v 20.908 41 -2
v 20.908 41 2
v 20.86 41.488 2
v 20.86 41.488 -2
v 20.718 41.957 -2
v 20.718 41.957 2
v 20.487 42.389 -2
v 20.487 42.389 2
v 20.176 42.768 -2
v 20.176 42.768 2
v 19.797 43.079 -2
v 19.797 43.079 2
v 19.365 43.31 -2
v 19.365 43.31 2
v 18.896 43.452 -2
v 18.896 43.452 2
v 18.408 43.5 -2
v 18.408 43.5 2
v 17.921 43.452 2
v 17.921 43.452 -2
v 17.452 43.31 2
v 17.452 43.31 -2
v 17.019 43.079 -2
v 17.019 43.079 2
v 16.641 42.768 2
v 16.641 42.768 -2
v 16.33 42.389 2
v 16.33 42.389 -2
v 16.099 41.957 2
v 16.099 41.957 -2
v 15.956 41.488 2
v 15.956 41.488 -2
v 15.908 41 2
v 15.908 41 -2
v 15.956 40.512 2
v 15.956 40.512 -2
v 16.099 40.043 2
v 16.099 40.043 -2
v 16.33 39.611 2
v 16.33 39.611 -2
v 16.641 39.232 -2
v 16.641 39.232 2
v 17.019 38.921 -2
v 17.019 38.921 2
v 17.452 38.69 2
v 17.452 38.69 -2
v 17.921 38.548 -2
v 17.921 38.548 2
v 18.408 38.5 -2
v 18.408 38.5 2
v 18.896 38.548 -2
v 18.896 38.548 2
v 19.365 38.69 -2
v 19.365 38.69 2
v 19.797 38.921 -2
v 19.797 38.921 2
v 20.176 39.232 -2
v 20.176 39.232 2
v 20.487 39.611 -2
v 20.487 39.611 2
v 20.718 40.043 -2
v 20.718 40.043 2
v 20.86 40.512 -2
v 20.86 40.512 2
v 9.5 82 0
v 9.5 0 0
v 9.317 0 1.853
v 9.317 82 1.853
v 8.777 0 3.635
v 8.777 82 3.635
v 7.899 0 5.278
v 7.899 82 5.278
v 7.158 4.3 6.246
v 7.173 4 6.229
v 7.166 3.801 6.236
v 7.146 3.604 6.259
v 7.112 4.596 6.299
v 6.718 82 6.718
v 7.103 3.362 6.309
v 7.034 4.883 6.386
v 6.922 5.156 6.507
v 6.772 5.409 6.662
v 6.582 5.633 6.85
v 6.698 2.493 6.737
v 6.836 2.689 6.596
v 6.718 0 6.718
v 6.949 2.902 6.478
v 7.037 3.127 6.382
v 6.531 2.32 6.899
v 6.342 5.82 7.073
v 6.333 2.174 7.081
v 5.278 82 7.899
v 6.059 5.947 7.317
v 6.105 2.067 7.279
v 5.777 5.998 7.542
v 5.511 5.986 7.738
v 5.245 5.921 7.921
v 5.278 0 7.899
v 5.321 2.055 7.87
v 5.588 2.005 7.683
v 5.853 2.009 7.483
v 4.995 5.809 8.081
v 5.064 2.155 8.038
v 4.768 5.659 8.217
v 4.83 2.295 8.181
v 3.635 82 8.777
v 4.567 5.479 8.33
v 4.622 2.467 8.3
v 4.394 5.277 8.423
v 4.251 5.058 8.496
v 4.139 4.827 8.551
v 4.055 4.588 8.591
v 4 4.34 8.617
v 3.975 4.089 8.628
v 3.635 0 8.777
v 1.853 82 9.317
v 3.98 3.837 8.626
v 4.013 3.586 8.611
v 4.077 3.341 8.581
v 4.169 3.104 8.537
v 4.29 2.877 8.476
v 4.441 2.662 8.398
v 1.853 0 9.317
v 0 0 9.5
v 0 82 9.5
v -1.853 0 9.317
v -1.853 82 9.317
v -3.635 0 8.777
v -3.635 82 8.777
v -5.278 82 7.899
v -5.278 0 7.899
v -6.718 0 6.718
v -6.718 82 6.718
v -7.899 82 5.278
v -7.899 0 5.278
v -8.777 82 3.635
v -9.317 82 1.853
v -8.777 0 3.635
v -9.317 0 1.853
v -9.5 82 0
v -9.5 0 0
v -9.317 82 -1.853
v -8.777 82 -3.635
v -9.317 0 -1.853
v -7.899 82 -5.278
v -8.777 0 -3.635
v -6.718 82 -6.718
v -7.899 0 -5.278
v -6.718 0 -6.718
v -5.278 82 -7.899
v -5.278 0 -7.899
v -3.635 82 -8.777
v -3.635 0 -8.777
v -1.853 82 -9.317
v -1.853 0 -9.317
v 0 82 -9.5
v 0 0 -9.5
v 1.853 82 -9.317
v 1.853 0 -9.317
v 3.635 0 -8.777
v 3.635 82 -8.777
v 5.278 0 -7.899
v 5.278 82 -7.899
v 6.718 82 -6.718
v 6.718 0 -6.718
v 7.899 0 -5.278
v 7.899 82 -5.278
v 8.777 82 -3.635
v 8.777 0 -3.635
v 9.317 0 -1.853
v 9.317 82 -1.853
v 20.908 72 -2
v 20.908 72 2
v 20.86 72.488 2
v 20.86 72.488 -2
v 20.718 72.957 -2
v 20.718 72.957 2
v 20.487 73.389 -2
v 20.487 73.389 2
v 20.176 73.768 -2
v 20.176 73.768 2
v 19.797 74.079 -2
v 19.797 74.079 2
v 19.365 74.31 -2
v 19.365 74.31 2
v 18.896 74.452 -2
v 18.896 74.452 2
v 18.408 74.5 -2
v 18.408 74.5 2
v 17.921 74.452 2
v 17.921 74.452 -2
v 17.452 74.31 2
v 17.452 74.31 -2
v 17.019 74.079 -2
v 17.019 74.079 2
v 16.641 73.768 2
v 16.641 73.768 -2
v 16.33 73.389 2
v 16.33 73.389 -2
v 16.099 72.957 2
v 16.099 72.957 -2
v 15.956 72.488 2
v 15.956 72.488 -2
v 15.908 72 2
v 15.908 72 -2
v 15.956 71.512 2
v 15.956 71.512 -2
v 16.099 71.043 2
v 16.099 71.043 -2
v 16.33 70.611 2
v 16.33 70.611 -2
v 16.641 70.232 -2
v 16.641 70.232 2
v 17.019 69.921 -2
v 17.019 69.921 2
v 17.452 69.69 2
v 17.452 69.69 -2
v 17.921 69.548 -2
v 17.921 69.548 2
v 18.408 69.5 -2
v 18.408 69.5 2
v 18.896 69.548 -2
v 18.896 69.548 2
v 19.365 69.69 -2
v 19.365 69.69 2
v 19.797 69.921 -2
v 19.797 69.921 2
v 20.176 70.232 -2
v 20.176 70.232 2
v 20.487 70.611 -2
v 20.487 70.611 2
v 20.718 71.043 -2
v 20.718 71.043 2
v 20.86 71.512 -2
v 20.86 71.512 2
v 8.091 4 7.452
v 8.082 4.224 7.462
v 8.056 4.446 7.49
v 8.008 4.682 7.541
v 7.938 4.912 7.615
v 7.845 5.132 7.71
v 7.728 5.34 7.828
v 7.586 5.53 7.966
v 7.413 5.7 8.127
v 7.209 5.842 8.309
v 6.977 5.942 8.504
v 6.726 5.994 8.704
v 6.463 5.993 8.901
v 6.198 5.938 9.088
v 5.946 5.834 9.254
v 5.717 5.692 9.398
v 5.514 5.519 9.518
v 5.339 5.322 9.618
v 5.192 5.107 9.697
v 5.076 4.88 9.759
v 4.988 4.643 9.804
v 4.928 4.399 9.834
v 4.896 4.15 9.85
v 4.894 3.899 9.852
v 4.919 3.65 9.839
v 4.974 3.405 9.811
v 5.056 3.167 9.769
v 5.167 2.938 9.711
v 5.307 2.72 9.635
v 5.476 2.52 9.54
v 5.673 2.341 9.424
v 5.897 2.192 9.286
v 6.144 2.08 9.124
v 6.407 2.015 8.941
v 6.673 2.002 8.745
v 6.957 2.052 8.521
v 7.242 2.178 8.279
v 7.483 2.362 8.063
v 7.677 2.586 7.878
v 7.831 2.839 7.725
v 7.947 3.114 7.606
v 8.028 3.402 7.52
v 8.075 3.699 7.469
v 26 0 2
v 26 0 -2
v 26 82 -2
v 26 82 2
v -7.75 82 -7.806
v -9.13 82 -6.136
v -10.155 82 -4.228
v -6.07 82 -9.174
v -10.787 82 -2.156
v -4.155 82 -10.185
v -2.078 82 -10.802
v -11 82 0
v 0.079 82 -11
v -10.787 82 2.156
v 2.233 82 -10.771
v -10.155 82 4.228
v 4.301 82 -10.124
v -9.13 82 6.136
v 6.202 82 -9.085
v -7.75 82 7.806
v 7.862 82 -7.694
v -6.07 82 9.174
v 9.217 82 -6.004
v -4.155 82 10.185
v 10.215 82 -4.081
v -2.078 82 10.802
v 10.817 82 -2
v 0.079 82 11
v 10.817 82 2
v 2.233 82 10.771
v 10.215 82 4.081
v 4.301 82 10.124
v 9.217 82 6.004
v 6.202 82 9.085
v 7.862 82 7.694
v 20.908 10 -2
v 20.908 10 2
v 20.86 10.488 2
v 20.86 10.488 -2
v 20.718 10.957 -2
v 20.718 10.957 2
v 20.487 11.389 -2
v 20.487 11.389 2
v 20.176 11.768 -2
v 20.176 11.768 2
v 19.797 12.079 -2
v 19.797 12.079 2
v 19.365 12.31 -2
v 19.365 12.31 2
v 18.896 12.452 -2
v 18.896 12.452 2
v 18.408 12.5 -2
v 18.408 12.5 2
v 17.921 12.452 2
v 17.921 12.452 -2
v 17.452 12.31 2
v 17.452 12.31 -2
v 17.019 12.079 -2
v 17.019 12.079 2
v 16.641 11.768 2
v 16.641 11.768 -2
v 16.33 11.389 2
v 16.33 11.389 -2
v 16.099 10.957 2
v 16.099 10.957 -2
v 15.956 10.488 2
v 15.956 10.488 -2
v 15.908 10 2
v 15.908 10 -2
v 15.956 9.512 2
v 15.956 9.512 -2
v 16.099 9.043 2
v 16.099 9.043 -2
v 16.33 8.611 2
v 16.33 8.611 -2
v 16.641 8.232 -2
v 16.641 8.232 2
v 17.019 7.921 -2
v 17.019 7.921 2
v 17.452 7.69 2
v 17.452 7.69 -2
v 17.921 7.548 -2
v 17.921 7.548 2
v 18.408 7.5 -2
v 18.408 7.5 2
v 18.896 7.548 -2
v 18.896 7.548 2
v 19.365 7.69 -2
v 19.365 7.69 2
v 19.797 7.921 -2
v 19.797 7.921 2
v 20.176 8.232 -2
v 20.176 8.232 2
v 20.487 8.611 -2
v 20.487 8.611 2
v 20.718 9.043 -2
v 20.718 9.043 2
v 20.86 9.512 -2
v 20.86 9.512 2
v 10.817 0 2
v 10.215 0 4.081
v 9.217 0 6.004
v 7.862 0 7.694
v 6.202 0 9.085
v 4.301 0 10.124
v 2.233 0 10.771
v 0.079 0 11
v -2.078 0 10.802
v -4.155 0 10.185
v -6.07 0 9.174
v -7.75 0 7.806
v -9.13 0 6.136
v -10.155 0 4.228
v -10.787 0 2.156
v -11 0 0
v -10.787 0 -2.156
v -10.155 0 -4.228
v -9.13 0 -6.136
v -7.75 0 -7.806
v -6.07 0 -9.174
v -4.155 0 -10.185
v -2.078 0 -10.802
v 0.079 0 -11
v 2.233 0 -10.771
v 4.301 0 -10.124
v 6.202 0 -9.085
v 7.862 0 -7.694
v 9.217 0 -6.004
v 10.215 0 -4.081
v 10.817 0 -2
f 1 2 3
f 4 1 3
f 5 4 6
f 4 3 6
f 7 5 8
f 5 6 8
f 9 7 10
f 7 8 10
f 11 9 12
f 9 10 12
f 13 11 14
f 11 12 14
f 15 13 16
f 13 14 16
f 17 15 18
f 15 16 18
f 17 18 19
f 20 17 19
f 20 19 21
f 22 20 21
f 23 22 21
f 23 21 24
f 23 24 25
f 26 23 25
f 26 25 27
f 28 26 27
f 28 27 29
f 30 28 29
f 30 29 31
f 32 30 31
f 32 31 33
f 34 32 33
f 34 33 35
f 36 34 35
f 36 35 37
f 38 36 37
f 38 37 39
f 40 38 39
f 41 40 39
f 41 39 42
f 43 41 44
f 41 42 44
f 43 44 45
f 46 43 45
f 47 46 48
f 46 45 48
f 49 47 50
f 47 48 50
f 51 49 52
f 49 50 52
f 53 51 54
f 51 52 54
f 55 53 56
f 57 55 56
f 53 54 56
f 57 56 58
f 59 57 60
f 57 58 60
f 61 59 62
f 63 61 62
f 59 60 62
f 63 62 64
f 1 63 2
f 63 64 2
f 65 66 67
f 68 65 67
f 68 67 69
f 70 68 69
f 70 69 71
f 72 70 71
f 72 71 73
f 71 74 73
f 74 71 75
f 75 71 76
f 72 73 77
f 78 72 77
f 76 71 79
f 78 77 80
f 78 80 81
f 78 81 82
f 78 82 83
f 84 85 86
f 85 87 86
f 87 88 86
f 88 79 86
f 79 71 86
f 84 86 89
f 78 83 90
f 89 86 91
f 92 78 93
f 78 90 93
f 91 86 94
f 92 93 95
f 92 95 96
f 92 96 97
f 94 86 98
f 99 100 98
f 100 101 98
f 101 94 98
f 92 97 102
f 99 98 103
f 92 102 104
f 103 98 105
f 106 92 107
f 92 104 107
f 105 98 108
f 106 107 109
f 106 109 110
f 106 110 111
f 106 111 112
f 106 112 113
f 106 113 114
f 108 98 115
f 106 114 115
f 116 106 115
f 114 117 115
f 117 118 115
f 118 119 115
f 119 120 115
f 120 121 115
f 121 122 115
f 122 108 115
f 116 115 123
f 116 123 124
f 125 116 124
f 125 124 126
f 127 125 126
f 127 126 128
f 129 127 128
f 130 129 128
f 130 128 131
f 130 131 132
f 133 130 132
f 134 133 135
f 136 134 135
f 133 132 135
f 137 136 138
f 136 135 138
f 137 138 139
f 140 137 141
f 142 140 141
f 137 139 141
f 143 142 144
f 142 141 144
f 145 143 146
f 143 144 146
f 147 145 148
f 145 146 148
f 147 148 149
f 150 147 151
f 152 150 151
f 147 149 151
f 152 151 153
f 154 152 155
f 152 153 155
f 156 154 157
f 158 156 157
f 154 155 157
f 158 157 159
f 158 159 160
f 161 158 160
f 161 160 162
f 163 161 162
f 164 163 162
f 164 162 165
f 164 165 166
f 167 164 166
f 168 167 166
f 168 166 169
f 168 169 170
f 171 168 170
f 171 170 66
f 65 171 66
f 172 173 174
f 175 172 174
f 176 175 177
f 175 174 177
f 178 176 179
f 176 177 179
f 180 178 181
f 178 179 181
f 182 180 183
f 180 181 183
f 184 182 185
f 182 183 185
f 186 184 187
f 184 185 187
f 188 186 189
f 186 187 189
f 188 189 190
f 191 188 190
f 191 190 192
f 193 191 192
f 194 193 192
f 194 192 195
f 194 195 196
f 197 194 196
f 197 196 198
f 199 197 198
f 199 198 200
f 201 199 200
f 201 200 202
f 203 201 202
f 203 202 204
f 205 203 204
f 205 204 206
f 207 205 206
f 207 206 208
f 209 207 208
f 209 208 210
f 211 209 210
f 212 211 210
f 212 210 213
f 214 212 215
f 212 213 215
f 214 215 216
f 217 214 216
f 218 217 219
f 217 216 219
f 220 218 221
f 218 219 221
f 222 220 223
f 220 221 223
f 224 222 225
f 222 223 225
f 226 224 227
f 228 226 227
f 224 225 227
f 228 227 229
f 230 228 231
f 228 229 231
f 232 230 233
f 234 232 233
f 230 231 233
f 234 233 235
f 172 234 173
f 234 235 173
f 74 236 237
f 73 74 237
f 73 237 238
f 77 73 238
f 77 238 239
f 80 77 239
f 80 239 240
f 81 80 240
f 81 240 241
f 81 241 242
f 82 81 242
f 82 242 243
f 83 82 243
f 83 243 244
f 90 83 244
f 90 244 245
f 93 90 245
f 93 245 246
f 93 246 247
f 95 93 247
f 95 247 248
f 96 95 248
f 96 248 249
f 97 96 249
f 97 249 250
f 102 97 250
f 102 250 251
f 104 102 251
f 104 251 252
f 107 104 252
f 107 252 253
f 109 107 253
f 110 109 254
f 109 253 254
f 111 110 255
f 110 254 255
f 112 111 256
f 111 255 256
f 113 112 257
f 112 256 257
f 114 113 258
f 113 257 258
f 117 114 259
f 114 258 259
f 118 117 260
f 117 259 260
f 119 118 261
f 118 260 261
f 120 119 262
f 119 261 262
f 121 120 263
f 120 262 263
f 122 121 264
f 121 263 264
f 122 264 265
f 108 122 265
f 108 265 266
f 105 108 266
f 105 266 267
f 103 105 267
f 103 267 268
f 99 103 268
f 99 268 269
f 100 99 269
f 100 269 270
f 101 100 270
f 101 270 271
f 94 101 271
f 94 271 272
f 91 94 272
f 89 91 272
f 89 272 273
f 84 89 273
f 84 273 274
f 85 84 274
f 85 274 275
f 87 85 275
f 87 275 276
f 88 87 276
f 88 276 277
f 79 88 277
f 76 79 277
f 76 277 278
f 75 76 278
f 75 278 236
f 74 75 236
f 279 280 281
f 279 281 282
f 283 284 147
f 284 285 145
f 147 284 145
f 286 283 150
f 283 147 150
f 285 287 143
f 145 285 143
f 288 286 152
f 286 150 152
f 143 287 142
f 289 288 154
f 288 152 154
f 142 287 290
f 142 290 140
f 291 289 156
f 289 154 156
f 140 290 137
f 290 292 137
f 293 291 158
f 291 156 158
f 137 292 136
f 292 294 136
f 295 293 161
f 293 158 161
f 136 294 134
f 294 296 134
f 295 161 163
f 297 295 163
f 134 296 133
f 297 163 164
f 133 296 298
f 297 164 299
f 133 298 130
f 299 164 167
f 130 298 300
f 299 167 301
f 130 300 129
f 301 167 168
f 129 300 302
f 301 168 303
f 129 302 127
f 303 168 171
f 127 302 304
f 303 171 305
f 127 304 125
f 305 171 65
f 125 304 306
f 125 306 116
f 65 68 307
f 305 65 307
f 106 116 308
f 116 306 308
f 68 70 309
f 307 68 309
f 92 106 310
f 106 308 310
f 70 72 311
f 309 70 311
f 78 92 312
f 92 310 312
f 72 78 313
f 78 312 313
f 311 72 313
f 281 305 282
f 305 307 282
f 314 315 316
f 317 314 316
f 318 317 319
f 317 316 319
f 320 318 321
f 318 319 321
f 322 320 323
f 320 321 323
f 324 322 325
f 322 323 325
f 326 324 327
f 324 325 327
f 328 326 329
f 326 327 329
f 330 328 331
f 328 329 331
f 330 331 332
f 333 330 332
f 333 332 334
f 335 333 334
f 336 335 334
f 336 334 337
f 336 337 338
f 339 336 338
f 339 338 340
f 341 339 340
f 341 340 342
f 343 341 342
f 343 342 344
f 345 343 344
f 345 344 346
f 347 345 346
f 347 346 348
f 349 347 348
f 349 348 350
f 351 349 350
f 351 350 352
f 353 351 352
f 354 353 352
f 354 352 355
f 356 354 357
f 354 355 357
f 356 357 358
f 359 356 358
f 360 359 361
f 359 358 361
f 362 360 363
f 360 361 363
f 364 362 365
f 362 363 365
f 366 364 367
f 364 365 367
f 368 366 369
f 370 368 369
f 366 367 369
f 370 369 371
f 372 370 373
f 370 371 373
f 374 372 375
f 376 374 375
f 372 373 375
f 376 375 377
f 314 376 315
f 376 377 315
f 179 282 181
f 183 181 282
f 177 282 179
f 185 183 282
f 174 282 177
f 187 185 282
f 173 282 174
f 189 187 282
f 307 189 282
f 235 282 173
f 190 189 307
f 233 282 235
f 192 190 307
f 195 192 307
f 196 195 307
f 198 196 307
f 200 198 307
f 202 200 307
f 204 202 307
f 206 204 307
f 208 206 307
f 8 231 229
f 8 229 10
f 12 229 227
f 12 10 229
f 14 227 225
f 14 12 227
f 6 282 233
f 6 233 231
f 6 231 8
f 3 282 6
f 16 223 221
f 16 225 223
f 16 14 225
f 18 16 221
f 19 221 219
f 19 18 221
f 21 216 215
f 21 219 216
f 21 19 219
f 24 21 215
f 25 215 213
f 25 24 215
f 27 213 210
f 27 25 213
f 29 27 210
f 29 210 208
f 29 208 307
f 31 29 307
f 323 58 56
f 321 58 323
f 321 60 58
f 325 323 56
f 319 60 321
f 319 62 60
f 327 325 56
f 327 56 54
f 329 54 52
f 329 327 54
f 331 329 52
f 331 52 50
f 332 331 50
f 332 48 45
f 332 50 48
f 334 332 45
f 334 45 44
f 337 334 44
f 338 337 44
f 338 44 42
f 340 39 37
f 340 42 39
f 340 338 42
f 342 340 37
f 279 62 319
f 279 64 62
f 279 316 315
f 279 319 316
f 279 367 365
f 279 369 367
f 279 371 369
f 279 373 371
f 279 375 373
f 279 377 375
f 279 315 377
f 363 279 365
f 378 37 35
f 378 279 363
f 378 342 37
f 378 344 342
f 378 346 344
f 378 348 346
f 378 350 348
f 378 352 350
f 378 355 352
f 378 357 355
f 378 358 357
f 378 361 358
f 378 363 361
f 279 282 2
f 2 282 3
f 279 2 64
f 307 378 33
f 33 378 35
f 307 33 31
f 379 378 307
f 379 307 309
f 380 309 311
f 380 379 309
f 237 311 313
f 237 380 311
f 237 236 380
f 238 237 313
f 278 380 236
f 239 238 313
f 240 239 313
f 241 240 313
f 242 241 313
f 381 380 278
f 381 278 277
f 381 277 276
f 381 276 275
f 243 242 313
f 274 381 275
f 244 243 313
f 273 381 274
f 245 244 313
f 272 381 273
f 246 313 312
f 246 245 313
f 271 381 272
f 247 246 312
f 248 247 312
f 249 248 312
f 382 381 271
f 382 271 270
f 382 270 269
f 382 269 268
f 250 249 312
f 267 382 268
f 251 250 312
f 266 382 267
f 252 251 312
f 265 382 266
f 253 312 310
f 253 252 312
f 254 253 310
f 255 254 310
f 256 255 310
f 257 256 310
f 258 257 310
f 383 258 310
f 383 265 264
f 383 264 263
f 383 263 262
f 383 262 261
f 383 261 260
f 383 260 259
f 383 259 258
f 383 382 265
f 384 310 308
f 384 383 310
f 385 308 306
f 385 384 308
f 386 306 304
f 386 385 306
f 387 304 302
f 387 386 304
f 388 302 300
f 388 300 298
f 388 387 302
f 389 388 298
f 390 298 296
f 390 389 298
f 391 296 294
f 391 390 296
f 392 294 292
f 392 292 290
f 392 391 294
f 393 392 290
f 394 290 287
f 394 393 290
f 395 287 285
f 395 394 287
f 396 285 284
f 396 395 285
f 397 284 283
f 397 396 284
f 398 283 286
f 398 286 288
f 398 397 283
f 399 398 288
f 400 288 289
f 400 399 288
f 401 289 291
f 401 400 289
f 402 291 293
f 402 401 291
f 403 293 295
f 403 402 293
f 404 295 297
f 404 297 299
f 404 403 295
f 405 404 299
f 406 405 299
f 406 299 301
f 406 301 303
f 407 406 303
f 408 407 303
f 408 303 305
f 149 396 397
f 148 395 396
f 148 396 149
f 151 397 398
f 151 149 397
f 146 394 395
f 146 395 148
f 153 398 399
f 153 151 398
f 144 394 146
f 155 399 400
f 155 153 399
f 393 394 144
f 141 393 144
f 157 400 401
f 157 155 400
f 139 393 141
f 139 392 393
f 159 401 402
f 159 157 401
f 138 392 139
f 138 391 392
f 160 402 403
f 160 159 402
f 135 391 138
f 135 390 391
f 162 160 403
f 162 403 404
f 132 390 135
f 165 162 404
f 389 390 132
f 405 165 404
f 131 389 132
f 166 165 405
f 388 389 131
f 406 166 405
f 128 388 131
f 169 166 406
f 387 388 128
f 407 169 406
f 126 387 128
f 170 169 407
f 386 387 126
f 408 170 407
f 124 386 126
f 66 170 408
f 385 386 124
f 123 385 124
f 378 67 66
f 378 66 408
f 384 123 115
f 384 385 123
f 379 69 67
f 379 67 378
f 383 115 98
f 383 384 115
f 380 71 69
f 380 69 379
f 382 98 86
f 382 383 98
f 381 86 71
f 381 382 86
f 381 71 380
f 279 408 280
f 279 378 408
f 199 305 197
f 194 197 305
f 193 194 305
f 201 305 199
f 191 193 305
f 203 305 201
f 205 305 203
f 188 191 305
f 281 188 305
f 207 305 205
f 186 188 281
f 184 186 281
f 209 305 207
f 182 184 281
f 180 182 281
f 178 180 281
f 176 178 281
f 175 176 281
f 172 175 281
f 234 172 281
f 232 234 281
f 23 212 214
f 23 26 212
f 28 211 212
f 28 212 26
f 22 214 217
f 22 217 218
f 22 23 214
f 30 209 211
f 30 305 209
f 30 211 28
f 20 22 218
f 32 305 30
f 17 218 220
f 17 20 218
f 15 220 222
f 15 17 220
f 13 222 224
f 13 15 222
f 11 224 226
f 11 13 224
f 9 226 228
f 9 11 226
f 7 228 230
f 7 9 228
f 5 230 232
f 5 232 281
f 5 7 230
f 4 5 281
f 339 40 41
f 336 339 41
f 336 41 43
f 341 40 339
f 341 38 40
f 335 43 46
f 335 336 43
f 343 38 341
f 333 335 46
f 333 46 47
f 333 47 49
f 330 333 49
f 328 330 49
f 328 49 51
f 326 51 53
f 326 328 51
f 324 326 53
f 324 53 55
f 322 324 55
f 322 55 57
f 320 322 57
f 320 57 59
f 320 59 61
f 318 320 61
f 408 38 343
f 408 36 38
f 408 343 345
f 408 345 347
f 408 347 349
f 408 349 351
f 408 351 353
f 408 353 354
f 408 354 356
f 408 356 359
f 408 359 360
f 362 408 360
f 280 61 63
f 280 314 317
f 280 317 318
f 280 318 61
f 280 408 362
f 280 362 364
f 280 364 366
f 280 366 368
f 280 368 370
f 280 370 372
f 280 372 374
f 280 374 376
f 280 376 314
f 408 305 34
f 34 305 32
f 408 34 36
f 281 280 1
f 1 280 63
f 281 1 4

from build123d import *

# Parameters (mm, degrees)
F0_R     = 9.5
F1_DEPTH = 82
F2_R     = 2.5
F3_DEPTH = 25
F6_R     = 2
F7_DEPTH = 5


with BuildPart() as f1:
    # F0 (on Front) → F1 (new body)
    with BuildSketch(Plane.XZ):
        with BuildLine():
            ThreePointArc((10.8166538264, -2), (10.9540675571, -1.004193186), (11, 0))
            ThreePointArc((11, 0), (10.9540675571, 1.004193186), (10.8166538264, 2))
            ThreePointArc((10.8166538264, 2), (-11, 0), (10.8166538264, -2))
        make_face()
        Circle(F0_R, mode=Mode.SUBTRACT)
        with BuildLine():
            ThreePointArc((10.8166538264, 2), (10.9540675571, 1.004193186), (11, 0))
            ThreePointArc((11, 0), (10.9540675571, -1.004193186), (10.8166538264, -2))
            Line((10.8166538264, -2), (26, -2))
            Line((26, -2), (26, 2))
            Line((26, 2), (10.8166538264, 2))
        make_face()
    extrude(amount=-F1_DEPTH)

    # F2 (on face) → F3 (cut)
    with BuildSketch(Plane.XY.offset(2)):
        with Locations((18.4083269132, 72)):
            Circle(F2_R)
        with Locations((18.4083269132, 41)):
            Circle(F2_R)
        with Locations((18.4083269132, 10)):
            Circle(F2_R)
    extrude(amount=-F3_DEPTH, mode=Mode.SUBTRACT)

    # F6 (on face) → F7 (cut)
    with BuildSketch(Plane(origin=(6.6010824652, 0, 8.799188047), x_dir=(0.7999261861, 0, -0.6000984059), z_dir=(0.6000984059, 0, 0.7999261861))):
        with Locations((0, 4)):
            Circle(F6_R)
    extrude(amount=-F7_DEPTH, mode=Mode.SUBTRACT)


solid = f1.part
